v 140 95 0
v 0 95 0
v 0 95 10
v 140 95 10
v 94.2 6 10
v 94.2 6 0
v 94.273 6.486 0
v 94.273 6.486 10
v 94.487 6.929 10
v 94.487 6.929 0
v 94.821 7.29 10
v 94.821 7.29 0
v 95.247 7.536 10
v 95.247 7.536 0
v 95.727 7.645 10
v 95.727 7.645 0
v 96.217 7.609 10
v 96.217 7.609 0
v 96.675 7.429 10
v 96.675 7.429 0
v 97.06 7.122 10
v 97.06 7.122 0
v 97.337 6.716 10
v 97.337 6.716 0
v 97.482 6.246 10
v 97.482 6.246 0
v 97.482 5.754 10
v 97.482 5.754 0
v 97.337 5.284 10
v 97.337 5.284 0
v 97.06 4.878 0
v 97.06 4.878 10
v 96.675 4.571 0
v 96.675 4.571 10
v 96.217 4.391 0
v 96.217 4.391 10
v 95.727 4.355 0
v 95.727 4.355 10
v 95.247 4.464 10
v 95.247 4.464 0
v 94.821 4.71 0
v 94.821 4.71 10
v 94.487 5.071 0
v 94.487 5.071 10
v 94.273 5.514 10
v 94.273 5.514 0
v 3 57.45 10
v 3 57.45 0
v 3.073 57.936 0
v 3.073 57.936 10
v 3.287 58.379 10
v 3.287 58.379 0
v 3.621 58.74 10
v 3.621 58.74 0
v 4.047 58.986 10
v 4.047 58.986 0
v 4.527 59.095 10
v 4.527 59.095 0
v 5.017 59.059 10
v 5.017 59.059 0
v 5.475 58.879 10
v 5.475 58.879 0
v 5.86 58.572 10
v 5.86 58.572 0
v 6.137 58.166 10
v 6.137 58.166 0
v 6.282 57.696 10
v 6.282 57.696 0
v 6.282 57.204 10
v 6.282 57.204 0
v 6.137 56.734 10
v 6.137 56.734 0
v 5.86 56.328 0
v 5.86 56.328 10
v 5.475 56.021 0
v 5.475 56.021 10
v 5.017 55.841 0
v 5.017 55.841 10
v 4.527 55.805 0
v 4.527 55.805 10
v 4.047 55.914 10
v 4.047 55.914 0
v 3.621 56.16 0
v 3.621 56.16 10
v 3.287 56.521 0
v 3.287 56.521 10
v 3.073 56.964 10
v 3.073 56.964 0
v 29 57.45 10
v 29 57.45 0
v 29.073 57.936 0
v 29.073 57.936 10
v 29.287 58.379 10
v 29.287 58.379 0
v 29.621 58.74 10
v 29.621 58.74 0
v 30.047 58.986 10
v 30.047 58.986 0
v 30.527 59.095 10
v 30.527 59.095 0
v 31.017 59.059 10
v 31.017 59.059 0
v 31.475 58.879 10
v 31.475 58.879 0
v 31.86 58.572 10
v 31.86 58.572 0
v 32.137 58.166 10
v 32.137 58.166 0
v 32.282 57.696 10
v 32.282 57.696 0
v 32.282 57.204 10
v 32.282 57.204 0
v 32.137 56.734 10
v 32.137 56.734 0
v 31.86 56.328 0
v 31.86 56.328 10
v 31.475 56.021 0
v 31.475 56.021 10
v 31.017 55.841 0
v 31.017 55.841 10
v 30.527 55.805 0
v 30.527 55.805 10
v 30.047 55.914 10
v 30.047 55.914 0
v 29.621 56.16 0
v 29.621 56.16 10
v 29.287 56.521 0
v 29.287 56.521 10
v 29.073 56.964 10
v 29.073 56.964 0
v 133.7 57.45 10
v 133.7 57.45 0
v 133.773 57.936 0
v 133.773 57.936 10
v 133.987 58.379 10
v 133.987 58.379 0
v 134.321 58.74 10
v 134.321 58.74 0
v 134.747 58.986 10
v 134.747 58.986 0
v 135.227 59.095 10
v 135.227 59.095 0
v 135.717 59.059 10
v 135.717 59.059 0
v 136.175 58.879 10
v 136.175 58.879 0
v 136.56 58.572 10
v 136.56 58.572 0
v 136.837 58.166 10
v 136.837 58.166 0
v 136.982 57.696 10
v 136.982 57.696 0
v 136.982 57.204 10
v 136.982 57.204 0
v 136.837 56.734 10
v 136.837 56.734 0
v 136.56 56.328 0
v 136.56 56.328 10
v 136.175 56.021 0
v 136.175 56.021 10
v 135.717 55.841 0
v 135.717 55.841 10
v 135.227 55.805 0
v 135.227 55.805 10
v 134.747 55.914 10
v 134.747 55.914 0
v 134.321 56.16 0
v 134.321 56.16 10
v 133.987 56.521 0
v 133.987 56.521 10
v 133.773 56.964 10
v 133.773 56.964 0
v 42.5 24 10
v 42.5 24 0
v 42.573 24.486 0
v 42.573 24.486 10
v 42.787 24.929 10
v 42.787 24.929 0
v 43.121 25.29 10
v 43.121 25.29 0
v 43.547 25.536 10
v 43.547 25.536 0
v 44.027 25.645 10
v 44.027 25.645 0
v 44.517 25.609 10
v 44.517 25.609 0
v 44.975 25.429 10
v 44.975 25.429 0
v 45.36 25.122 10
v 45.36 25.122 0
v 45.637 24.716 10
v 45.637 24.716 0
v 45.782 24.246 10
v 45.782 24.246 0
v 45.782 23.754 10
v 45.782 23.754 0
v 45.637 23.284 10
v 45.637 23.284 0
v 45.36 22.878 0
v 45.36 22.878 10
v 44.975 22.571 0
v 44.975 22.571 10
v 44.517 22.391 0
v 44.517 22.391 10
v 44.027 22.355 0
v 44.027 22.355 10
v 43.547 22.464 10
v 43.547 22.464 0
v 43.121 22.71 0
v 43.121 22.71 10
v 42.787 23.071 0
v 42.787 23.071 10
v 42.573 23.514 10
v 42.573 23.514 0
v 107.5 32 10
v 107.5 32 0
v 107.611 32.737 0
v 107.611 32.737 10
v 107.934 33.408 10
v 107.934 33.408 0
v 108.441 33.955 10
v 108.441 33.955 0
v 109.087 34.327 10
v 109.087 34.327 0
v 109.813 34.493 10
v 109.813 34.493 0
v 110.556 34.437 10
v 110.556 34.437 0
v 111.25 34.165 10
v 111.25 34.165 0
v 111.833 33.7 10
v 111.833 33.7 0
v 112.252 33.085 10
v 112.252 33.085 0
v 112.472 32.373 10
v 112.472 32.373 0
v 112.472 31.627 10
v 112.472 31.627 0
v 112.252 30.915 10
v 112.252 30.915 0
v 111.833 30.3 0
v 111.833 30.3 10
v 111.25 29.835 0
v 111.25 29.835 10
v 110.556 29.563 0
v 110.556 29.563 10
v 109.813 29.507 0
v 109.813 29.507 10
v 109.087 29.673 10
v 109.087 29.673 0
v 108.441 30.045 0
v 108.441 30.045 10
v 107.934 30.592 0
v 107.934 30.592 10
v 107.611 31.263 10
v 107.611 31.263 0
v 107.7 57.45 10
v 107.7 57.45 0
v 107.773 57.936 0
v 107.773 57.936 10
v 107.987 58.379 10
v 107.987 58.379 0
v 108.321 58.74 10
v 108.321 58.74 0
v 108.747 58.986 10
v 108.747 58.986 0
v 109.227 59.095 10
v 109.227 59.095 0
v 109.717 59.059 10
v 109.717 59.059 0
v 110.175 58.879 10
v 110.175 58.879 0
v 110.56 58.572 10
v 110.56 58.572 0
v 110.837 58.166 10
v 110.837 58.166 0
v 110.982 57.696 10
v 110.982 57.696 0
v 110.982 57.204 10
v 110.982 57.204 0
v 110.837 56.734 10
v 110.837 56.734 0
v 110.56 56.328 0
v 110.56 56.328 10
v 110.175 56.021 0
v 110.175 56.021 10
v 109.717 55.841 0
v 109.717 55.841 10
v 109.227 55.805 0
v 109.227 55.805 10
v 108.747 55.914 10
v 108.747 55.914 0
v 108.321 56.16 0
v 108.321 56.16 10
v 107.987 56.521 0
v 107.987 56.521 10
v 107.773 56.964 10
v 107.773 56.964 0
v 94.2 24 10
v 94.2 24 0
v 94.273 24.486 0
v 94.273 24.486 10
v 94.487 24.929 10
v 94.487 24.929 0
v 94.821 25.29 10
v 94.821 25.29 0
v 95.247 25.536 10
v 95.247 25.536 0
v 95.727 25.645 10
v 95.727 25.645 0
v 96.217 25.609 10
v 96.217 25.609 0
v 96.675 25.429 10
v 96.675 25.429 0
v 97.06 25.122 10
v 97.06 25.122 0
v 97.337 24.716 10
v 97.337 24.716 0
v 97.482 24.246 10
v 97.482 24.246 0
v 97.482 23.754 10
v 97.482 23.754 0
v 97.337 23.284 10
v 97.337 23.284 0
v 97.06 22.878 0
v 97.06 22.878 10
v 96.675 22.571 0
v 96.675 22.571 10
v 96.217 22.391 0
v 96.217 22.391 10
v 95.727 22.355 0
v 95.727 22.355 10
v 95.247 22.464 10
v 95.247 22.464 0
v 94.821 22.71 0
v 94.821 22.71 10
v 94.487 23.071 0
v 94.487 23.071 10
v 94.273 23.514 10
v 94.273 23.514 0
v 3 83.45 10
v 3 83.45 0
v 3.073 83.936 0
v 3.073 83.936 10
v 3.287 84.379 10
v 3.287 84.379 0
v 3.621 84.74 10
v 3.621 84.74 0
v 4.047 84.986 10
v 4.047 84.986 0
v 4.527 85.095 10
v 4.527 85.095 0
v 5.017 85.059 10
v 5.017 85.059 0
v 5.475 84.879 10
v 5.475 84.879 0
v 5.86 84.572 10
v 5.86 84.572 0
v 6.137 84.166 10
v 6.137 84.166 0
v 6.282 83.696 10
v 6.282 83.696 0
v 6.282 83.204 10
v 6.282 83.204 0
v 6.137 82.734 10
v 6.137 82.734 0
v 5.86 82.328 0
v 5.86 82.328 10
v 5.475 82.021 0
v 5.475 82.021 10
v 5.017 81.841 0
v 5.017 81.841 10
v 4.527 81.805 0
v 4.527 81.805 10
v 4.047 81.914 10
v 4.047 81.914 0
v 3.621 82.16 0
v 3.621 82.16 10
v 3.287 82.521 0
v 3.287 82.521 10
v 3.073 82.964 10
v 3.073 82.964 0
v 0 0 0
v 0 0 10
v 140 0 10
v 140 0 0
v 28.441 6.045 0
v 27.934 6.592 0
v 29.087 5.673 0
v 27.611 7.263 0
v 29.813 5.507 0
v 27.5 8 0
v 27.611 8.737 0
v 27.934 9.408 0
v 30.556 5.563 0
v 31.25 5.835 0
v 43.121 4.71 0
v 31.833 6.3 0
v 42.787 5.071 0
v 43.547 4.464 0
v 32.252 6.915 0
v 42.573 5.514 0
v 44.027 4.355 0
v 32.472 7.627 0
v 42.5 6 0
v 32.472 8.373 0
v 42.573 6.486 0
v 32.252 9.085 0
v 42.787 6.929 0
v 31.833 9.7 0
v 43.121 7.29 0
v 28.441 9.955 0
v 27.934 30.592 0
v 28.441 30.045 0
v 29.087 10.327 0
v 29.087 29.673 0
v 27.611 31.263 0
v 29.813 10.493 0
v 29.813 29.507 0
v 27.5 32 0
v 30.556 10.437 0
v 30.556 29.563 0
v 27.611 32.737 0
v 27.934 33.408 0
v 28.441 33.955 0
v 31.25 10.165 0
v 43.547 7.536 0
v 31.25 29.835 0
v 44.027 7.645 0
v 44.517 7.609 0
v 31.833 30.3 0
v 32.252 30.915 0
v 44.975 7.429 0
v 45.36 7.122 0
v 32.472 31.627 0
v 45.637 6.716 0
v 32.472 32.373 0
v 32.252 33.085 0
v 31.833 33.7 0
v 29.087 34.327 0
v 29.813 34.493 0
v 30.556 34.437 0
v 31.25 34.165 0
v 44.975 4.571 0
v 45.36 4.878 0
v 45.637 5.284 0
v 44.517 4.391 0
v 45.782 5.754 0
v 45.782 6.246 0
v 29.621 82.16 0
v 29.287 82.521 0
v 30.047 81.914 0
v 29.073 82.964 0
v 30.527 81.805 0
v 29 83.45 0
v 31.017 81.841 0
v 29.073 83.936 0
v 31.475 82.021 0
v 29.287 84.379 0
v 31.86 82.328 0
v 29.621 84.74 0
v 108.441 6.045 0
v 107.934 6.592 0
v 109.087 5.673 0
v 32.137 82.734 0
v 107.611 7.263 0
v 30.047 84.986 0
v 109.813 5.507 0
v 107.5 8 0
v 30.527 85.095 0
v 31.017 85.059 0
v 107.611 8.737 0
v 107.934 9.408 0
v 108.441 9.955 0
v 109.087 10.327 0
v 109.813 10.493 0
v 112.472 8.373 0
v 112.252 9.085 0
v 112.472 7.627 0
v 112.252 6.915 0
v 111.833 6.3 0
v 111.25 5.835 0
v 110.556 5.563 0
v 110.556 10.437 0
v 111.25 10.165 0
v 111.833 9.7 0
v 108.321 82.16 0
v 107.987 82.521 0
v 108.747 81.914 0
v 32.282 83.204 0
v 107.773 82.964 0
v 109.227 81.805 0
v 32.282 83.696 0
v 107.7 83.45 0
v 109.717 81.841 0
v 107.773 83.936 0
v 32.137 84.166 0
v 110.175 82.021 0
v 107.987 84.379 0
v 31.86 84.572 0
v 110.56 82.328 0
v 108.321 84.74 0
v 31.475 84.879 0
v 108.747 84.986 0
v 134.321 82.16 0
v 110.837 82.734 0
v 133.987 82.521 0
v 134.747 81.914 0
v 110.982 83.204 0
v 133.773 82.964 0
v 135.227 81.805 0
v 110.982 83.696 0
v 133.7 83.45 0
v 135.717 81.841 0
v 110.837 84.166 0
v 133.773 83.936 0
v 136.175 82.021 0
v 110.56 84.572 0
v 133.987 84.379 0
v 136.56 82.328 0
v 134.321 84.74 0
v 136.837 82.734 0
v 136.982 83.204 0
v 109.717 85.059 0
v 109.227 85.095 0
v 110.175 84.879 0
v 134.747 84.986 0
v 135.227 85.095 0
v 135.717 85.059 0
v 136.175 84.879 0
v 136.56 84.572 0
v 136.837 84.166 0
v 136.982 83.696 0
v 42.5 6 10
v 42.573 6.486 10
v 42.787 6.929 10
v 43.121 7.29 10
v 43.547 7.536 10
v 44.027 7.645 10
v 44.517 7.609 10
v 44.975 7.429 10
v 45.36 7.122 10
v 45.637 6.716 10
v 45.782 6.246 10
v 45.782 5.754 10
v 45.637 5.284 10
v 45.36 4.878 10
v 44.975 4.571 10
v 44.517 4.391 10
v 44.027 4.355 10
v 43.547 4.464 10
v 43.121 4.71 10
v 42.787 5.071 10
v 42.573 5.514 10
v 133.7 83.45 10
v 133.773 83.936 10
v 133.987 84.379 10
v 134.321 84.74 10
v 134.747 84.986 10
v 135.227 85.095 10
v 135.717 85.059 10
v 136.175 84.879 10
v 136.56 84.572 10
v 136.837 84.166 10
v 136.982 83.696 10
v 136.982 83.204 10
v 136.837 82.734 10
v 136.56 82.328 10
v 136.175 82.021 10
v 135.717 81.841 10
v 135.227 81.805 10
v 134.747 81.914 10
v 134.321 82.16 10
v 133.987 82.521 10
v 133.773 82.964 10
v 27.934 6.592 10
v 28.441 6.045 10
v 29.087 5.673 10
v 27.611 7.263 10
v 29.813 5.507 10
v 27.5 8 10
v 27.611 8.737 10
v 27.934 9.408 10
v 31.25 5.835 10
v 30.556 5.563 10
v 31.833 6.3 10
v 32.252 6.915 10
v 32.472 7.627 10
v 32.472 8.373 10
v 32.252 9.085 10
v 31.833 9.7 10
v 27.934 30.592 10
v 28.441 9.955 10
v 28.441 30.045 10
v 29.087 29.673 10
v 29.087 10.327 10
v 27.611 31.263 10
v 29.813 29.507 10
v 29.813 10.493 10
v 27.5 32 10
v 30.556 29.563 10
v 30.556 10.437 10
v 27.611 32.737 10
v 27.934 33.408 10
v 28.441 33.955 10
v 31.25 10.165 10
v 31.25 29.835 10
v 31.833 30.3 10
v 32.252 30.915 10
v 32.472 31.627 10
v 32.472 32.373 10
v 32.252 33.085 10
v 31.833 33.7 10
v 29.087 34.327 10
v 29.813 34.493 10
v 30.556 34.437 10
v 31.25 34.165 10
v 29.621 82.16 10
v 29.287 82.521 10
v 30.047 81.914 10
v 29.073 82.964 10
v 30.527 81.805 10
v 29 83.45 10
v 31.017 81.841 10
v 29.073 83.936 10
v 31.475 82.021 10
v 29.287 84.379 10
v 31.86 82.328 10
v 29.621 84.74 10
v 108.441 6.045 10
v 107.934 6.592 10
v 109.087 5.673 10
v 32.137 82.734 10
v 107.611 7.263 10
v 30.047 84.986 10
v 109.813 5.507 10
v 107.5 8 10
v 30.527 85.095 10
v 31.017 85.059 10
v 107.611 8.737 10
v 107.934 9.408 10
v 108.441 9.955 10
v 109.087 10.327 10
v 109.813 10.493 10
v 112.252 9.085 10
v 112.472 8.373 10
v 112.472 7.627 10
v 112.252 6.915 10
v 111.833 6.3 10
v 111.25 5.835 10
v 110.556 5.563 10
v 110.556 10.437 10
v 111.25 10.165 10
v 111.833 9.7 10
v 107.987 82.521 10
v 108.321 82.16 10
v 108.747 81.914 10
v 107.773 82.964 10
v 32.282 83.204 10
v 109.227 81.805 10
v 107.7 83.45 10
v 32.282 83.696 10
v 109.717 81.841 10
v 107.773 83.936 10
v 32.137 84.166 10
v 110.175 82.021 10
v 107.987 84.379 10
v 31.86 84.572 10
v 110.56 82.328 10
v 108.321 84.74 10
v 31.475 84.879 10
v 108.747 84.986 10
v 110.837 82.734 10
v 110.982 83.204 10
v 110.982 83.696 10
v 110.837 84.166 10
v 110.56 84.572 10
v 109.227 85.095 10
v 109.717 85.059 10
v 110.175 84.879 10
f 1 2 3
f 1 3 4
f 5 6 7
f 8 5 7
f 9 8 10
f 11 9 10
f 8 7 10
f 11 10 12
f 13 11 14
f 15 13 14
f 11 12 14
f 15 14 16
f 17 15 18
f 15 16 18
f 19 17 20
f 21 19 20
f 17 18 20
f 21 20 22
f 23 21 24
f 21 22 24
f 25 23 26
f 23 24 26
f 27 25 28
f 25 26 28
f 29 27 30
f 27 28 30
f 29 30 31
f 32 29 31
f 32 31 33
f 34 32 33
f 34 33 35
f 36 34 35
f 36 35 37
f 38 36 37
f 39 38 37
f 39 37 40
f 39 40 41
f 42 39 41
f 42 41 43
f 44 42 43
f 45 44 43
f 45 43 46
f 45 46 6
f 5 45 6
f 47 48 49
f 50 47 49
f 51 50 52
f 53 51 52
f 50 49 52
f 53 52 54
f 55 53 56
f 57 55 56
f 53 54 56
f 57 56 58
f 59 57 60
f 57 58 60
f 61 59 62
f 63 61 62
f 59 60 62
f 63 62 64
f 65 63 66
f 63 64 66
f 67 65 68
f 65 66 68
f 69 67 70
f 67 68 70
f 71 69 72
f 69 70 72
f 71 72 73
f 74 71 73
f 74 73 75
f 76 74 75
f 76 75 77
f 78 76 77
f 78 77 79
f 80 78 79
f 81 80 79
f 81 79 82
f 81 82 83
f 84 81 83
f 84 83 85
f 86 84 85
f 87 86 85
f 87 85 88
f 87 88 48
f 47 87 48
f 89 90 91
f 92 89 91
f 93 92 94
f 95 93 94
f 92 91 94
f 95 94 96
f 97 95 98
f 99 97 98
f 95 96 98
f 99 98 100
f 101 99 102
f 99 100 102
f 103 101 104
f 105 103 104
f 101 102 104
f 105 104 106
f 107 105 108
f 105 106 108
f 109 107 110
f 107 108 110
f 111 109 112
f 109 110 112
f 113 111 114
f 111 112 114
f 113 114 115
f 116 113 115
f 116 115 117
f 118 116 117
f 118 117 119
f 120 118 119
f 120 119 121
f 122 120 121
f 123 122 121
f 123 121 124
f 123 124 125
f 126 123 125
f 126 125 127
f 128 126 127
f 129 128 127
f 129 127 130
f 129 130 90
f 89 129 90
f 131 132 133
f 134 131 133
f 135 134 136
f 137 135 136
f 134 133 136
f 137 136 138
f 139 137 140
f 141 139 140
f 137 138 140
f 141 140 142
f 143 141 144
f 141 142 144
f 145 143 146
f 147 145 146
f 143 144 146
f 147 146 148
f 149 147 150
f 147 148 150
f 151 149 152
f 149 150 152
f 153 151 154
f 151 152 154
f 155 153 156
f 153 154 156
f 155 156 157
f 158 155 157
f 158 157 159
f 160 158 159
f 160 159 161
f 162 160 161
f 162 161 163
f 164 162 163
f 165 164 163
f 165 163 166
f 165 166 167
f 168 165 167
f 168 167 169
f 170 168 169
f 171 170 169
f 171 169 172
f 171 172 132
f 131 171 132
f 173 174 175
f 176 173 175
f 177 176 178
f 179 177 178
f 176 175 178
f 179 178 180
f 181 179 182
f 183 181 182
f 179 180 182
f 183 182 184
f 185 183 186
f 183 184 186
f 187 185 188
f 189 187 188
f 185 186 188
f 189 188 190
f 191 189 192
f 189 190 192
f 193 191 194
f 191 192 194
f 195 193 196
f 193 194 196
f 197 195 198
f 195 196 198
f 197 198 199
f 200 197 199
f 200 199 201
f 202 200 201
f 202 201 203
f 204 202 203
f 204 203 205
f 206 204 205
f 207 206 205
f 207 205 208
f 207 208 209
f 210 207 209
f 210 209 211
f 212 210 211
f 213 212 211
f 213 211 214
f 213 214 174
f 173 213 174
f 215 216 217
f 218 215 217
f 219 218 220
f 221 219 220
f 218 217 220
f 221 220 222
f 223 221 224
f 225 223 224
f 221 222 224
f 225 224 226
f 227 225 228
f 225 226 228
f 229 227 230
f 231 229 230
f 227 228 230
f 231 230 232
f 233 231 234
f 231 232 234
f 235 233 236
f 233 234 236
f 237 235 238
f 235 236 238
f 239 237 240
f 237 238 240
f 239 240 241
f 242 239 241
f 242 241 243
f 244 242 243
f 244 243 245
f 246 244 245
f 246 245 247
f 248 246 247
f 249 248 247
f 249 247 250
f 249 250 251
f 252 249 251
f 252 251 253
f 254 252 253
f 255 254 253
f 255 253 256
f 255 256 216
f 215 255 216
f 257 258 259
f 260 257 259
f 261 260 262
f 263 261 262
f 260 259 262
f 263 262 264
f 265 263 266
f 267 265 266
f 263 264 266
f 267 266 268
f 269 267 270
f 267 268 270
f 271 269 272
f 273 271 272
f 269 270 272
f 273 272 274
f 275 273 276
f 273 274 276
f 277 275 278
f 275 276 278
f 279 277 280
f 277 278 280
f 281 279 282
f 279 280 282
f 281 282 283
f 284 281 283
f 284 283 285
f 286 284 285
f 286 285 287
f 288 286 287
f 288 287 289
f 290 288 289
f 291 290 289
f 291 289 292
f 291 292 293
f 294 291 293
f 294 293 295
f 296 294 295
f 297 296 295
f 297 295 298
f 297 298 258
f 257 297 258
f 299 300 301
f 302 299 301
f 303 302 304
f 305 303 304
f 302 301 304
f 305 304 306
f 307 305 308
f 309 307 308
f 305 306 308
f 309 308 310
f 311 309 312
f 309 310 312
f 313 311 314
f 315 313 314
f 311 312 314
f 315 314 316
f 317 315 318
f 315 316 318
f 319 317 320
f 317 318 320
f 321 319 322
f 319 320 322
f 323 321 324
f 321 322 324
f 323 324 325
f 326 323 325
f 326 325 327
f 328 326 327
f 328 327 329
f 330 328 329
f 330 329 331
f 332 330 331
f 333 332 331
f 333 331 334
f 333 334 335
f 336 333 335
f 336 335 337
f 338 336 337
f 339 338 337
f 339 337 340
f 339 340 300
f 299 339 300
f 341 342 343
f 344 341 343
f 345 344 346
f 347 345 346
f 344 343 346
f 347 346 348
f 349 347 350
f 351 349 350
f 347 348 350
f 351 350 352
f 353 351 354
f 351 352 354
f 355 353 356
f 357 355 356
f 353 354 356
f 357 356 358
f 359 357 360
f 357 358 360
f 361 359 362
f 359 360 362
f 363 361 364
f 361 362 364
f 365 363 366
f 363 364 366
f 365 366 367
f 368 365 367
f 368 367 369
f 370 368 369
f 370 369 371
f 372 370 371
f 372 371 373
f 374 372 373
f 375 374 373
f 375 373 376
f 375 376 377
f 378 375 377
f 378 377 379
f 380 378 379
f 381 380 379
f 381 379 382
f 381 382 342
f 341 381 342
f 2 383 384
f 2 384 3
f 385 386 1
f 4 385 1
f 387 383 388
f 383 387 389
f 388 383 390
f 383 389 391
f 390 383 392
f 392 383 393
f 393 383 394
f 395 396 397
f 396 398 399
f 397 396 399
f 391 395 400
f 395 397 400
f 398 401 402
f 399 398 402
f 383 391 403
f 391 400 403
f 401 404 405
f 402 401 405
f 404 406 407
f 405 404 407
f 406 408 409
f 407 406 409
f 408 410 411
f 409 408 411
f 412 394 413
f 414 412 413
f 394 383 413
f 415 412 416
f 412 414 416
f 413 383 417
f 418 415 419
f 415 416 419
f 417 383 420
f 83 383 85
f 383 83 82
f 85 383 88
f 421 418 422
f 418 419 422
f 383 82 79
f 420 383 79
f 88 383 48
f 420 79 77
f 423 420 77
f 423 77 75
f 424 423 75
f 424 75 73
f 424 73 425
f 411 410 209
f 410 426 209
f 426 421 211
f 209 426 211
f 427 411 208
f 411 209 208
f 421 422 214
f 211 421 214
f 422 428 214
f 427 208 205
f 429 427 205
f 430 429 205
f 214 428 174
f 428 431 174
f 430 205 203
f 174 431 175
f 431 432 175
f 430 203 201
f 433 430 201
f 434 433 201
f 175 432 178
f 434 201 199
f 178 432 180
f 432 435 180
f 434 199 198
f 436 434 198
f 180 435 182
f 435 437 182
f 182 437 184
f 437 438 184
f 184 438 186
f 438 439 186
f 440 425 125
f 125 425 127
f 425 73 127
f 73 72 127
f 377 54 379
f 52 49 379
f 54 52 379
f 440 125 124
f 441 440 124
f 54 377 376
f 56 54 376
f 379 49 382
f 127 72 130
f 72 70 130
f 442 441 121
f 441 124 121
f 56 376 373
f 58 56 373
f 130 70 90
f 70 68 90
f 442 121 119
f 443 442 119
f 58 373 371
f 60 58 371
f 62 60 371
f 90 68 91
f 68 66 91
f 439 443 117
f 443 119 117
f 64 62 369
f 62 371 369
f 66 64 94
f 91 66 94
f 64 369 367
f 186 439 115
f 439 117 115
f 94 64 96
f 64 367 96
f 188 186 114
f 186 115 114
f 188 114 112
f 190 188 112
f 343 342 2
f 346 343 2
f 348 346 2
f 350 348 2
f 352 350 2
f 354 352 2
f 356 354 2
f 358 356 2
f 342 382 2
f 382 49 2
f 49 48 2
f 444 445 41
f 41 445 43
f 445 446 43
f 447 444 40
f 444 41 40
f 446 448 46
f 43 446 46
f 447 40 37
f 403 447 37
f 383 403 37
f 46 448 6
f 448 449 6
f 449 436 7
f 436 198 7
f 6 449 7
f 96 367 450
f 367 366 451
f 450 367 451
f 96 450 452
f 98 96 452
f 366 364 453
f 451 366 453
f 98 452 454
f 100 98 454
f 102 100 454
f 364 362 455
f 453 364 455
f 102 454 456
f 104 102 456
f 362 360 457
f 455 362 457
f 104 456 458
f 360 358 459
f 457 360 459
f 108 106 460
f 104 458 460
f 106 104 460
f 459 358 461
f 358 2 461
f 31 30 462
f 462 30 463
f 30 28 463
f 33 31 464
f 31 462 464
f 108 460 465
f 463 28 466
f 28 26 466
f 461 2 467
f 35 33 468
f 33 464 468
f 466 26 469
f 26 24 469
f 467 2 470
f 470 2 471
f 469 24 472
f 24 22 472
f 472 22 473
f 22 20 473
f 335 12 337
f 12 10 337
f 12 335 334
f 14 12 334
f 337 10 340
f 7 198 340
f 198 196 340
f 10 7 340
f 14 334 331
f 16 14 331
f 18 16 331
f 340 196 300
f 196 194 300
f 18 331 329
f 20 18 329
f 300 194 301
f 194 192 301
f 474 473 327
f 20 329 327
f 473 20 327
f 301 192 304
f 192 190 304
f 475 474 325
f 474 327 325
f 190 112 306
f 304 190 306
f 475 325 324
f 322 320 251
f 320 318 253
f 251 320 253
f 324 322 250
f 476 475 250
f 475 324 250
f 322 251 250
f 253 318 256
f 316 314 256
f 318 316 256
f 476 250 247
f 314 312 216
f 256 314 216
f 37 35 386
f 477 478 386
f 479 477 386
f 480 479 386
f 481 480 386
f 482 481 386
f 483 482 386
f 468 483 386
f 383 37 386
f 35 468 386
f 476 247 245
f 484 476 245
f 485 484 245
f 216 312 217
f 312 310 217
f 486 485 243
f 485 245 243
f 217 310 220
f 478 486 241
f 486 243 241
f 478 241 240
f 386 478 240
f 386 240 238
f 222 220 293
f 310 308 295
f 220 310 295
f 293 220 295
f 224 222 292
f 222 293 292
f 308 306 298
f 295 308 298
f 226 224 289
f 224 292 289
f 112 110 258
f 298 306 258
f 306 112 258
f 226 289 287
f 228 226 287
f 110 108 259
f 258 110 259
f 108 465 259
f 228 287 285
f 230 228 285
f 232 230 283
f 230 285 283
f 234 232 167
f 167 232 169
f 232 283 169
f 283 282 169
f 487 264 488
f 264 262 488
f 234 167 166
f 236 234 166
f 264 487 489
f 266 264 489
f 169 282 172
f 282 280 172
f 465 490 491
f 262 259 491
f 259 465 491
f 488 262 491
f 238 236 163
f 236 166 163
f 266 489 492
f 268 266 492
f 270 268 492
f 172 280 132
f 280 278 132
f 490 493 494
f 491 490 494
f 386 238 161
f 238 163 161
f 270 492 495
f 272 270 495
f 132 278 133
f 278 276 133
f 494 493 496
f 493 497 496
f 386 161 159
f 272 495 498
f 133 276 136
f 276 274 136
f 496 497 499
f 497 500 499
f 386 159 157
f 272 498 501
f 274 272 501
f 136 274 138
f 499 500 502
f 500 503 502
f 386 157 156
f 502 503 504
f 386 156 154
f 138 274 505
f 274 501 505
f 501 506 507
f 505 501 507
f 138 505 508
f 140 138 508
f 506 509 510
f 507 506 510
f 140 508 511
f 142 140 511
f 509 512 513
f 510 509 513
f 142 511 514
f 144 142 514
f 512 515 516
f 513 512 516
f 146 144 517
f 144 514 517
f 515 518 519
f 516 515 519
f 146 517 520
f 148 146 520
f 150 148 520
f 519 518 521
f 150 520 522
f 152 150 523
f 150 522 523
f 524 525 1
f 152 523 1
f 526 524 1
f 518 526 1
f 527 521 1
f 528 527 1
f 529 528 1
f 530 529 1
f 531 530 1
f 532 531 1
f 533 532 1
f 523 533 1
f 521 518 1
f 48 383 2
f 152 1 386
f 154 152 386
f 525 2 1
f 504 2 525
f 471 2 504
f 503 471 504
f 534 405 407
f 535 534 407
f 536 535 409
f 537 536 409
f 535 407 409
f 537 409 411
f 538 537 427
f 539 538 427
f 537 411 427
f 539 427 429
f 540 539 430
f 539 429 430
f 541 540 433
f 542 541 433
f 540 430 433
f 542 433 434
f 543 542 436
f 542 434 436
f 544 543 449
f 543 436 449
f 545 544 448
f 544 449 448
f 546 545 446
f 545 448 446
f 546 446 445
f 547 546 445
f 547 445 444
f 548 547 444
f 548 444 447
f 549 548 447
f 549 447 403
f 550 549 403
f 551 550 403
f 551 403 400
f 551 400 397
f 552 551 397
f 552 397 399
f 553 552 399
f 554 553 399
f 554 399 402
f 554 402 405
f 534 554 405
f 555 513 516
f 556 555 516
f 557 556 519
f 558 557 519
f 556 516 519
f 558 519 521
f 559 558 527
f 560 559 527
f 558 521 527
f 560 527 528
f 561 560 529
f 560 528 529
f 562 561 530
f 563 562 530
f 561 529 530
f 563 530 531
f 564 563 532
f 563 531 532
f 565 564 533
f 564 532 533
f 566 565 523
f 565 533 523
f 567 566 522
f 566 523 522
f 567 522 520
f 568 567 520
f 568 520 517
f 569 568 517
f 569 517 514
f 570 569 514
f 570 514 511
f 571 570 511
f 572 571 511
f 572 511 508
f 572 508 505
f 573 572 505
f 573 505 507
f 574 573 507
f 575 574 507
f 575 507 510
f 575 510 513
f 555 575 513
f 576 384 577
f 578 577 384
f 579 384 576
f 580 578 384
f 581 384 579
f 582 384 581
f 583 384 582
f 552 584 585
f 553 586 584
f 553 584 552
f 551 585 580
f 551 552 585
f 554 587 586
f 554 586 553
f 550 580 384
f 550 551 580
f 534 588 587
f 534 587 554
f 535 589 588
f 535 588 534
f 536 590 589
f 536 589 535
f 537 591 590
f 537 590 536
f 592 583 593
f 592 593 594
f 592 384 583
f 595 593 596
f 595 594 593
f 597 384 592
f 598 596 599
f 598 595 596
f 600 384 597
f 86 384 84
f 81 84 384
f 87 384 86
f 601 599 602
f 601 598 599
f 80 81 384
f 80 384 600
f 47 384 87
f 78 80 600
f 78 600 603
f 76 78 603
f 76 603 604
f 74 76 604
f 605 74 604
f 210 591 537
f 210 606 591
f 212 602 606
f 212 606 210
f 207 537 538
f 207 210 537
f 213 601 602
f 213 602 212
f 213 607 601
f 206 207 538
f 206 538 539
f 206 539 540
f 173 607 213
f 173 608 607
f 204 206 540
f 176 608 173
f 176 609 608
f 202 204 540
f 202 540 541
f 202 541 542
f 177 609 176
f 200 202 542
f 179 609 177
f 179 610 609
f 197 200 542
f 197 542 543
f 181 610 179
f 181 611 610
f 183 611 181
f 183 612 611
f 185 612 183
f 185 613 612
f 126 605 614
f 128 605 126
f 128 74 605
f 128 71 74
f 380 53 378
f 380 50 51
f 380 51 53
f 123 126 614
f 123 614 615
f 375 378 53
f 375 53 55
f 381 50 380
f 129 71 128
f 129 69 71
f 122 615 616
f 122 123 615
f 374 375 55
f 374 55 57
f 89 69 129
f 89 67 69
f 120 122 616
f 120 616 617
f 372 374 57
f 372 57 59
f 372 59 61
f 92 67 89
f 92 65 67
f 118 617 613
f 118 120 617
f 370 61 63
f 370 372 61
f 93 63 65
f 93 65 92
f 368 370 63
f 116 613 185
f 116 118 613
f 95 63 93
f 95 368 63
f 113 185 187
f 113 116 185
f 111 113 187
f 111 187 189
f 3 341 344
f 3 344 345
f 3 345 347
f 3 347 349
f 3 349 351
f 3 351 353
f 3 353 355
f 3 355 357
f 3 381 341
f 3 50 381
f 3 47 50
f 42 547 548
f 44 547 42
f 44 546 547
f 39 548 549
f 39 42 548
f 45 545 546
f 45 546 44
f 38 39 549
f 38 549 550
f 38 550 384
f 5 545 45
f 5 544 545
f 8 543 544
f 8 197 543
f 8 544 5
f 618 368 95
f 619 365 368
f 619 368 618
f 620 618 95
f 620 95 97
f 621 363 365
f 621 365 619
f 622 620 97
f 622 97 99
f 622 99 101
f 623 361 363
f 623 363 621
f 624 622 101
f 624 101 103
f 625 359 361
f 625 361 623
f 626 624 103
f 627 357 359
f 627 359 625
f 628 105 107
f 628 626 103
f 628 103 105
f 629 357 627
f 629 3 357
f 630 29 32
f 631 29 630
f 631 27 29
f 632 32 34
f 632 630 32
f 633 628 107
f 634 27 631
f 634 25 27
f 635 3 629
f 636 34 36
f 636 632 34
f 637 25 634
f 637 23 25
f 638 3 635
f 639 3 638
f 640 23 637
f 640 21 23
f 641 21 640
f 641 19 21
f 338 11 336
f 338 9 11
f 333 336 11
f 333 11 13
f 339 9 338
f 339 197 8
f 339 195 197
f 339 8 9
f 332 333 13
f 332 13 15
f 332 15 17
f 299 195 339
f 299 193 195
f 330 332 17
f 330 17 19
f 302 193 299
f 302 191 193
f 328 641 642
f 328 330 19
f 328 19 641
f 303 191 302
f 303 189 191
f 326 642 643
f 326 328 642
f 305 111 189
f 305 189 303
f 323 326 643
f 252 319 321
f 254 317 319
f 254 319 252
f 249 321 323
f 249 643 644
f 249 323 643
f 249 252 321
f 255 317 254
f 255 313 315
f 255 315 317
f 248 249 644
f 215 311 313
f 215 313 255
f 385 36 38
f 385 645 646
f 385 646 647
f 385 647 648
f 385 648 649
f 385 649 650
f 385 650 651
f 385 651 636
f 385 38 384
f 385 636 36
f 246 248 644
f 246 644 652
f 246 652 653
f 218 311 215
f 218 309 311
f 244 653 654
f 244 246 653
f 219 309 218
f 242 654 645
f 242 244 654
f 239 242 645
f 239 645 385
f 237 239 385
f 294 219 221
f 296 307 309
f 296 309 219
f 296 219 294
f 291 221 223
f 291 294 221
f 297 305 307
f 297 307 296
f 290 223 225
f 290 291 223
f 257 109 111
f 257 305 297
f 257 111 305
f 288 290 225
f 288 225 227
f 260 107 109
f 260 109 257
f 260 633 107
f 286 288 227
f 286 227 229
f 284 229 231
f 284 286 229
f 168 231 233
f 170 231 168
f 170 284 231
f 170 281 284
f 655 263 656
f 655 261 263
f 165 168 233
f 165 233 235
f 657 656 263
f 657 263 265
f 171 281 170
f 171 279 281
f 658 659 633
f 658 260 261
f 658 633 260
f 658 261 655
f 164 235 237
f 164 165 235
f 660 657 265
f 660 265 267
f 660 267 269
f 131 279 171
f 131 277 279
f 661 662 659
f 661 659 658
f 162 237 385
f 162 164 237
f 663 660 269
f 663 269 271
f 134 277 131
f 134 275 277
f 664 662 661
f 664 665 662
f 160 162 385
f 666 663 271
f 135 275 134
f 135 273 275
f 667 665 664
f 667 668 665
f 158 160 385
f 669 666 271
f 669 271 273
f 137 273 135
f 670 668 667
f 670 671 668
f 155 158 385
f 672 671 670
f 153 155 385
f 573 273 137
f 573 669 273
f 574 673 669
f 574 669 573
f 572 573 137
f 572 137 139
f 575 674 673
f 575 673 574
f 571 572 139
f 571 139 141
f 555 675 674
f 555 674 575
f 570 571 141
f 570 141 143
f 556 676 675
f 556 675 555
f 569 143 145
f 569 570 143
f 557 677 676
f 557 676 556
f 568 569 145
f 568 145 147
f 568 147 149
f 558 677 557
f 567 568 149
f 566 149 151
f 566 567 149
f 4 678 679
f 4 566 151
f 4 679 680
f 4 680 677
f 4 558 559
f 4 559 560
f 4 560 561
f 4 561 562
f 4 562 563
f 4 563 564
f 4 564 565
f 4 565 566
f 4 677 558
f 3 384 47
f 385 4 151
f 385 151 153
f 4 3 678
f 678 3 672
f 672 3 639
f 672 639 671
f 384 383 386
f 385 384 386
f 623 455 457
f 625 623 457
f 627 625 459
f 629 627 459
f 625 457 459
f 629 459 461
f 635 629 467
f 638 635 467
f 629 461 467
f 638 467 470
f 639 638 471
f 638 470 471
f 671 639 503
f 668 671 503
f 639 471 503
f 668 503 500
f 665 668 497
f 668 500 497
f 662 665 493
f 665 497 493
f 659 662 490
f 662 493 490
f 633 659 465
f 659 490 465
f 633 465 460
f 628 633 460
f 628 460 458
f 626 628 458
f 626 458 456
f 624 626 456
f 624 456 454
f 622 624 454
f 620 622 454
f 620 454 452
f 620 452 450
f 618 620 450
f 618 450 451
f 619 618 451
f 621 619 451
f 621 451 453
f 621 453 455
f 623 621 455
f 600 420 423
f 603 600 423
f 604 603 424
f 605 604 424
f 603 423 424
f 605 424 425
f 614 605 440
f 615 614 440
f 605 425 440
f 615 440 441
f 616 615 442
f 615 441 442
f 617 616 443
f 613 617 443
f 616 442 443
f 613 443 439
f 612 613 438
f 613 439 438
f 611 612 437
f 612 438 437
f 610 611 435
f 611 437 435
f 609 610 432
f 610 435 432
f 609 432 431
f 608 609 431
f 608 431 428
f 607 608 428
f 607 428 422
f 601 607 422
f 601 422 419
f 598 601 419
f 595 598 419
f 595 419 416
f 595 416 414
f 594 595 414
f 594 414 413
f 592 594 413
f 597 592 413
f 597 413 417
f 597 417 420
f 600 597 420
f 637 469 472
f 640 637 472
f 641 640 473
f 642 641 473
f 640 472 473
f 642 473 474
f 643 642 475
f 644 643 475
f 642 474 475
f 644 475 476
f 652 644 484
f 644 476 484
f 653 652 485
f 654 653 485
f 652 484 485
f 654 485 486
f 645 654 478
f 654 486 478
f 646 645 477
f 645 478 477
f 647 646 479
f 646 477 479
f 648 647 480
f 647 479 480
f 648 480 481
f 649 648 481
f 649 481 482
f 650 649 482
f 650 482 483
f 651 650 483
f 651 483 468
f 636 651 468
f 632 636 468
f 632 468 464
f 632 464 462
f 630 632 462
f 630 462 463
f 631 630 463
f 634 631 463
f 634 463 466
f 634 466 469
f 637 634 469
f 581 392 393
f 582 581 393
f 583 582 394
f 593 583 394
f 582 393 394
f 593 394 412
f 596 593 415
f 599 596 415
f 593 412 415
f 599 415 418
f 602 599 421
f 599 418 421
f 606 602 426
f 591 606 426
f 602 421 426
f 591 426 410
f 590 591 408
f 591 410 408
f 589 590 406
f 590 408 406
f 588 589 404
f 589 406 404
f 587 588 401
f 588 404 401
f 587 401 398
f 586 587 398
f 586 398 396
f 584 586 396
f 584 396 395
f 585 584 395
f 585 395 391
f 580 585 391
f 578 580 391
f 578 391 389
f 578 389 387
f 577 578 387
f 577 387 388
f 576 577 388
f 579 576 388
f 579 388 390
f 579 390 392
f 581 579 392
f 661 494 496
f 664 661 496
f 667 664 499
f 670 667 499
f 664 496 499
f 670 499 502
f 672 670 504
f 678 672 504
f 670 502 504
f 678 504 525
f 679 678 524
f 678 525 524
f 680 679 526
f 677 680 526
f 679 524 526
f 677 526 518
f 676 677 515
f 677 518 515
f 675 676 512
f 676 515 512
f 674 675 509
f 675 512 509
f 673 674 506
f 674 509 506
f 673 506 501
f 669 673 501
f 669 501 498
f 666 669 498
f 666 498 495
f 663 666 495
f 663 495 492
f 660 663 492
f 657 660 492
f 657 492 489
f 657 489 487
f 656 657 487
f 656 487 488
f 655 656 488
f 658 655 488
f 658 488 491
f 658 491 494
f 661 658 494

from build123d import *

# Parameters (mm, degrees)
SKETCH_1_W         = 140
SKETCH_1_H         = 95
EXTRUDE_1_DEPTH    = 10
HOLE_WIZARD_M4_1_D = 3.3
HOLE_WIZARD_M6_1_D = 5


with BuildPart() as part:
    # 草图1 → 凸台-拉伸1 (new body)
    with BuildSketch(Plane.XY):
        with Locations((70, 47.5)):
            Rectangle(SKETCH_1_W, SKETCH_1_H)
    extrude(amount=EXTRUDE_1_DEPTH)

    # M4 螺纹孔1 (through all)
    with Locations(Plane(origin=(4.65, 83.45, 10), x_dir=(1, 0, 0), z_dir=(0, 0, 1))):
        with Locations((0, 0), (0, -26), (26, -26), (26, 0), (104.7, 0), (130.7, 0), (130.7, -26), (104.7, -26), (39.5, -59.45), (39.5, -77.45), (91.2, -59.45), (91.2, -77.45)):
            Hole(HOLE_WIZARD_M4_1_D / 2)

    # M6 螺纹孔1 (through all)
    with Locations(Plane(origin=(30, 32, 10), x_dir=(1, 0, 0), z_dir=(0, 0, 1))):
        with Locations((0, 0), (0, -24), (80, 0), (80, -24)):
            Hole(HOLE_WIZARD_M6_1_D / 2)


solid = part.part
